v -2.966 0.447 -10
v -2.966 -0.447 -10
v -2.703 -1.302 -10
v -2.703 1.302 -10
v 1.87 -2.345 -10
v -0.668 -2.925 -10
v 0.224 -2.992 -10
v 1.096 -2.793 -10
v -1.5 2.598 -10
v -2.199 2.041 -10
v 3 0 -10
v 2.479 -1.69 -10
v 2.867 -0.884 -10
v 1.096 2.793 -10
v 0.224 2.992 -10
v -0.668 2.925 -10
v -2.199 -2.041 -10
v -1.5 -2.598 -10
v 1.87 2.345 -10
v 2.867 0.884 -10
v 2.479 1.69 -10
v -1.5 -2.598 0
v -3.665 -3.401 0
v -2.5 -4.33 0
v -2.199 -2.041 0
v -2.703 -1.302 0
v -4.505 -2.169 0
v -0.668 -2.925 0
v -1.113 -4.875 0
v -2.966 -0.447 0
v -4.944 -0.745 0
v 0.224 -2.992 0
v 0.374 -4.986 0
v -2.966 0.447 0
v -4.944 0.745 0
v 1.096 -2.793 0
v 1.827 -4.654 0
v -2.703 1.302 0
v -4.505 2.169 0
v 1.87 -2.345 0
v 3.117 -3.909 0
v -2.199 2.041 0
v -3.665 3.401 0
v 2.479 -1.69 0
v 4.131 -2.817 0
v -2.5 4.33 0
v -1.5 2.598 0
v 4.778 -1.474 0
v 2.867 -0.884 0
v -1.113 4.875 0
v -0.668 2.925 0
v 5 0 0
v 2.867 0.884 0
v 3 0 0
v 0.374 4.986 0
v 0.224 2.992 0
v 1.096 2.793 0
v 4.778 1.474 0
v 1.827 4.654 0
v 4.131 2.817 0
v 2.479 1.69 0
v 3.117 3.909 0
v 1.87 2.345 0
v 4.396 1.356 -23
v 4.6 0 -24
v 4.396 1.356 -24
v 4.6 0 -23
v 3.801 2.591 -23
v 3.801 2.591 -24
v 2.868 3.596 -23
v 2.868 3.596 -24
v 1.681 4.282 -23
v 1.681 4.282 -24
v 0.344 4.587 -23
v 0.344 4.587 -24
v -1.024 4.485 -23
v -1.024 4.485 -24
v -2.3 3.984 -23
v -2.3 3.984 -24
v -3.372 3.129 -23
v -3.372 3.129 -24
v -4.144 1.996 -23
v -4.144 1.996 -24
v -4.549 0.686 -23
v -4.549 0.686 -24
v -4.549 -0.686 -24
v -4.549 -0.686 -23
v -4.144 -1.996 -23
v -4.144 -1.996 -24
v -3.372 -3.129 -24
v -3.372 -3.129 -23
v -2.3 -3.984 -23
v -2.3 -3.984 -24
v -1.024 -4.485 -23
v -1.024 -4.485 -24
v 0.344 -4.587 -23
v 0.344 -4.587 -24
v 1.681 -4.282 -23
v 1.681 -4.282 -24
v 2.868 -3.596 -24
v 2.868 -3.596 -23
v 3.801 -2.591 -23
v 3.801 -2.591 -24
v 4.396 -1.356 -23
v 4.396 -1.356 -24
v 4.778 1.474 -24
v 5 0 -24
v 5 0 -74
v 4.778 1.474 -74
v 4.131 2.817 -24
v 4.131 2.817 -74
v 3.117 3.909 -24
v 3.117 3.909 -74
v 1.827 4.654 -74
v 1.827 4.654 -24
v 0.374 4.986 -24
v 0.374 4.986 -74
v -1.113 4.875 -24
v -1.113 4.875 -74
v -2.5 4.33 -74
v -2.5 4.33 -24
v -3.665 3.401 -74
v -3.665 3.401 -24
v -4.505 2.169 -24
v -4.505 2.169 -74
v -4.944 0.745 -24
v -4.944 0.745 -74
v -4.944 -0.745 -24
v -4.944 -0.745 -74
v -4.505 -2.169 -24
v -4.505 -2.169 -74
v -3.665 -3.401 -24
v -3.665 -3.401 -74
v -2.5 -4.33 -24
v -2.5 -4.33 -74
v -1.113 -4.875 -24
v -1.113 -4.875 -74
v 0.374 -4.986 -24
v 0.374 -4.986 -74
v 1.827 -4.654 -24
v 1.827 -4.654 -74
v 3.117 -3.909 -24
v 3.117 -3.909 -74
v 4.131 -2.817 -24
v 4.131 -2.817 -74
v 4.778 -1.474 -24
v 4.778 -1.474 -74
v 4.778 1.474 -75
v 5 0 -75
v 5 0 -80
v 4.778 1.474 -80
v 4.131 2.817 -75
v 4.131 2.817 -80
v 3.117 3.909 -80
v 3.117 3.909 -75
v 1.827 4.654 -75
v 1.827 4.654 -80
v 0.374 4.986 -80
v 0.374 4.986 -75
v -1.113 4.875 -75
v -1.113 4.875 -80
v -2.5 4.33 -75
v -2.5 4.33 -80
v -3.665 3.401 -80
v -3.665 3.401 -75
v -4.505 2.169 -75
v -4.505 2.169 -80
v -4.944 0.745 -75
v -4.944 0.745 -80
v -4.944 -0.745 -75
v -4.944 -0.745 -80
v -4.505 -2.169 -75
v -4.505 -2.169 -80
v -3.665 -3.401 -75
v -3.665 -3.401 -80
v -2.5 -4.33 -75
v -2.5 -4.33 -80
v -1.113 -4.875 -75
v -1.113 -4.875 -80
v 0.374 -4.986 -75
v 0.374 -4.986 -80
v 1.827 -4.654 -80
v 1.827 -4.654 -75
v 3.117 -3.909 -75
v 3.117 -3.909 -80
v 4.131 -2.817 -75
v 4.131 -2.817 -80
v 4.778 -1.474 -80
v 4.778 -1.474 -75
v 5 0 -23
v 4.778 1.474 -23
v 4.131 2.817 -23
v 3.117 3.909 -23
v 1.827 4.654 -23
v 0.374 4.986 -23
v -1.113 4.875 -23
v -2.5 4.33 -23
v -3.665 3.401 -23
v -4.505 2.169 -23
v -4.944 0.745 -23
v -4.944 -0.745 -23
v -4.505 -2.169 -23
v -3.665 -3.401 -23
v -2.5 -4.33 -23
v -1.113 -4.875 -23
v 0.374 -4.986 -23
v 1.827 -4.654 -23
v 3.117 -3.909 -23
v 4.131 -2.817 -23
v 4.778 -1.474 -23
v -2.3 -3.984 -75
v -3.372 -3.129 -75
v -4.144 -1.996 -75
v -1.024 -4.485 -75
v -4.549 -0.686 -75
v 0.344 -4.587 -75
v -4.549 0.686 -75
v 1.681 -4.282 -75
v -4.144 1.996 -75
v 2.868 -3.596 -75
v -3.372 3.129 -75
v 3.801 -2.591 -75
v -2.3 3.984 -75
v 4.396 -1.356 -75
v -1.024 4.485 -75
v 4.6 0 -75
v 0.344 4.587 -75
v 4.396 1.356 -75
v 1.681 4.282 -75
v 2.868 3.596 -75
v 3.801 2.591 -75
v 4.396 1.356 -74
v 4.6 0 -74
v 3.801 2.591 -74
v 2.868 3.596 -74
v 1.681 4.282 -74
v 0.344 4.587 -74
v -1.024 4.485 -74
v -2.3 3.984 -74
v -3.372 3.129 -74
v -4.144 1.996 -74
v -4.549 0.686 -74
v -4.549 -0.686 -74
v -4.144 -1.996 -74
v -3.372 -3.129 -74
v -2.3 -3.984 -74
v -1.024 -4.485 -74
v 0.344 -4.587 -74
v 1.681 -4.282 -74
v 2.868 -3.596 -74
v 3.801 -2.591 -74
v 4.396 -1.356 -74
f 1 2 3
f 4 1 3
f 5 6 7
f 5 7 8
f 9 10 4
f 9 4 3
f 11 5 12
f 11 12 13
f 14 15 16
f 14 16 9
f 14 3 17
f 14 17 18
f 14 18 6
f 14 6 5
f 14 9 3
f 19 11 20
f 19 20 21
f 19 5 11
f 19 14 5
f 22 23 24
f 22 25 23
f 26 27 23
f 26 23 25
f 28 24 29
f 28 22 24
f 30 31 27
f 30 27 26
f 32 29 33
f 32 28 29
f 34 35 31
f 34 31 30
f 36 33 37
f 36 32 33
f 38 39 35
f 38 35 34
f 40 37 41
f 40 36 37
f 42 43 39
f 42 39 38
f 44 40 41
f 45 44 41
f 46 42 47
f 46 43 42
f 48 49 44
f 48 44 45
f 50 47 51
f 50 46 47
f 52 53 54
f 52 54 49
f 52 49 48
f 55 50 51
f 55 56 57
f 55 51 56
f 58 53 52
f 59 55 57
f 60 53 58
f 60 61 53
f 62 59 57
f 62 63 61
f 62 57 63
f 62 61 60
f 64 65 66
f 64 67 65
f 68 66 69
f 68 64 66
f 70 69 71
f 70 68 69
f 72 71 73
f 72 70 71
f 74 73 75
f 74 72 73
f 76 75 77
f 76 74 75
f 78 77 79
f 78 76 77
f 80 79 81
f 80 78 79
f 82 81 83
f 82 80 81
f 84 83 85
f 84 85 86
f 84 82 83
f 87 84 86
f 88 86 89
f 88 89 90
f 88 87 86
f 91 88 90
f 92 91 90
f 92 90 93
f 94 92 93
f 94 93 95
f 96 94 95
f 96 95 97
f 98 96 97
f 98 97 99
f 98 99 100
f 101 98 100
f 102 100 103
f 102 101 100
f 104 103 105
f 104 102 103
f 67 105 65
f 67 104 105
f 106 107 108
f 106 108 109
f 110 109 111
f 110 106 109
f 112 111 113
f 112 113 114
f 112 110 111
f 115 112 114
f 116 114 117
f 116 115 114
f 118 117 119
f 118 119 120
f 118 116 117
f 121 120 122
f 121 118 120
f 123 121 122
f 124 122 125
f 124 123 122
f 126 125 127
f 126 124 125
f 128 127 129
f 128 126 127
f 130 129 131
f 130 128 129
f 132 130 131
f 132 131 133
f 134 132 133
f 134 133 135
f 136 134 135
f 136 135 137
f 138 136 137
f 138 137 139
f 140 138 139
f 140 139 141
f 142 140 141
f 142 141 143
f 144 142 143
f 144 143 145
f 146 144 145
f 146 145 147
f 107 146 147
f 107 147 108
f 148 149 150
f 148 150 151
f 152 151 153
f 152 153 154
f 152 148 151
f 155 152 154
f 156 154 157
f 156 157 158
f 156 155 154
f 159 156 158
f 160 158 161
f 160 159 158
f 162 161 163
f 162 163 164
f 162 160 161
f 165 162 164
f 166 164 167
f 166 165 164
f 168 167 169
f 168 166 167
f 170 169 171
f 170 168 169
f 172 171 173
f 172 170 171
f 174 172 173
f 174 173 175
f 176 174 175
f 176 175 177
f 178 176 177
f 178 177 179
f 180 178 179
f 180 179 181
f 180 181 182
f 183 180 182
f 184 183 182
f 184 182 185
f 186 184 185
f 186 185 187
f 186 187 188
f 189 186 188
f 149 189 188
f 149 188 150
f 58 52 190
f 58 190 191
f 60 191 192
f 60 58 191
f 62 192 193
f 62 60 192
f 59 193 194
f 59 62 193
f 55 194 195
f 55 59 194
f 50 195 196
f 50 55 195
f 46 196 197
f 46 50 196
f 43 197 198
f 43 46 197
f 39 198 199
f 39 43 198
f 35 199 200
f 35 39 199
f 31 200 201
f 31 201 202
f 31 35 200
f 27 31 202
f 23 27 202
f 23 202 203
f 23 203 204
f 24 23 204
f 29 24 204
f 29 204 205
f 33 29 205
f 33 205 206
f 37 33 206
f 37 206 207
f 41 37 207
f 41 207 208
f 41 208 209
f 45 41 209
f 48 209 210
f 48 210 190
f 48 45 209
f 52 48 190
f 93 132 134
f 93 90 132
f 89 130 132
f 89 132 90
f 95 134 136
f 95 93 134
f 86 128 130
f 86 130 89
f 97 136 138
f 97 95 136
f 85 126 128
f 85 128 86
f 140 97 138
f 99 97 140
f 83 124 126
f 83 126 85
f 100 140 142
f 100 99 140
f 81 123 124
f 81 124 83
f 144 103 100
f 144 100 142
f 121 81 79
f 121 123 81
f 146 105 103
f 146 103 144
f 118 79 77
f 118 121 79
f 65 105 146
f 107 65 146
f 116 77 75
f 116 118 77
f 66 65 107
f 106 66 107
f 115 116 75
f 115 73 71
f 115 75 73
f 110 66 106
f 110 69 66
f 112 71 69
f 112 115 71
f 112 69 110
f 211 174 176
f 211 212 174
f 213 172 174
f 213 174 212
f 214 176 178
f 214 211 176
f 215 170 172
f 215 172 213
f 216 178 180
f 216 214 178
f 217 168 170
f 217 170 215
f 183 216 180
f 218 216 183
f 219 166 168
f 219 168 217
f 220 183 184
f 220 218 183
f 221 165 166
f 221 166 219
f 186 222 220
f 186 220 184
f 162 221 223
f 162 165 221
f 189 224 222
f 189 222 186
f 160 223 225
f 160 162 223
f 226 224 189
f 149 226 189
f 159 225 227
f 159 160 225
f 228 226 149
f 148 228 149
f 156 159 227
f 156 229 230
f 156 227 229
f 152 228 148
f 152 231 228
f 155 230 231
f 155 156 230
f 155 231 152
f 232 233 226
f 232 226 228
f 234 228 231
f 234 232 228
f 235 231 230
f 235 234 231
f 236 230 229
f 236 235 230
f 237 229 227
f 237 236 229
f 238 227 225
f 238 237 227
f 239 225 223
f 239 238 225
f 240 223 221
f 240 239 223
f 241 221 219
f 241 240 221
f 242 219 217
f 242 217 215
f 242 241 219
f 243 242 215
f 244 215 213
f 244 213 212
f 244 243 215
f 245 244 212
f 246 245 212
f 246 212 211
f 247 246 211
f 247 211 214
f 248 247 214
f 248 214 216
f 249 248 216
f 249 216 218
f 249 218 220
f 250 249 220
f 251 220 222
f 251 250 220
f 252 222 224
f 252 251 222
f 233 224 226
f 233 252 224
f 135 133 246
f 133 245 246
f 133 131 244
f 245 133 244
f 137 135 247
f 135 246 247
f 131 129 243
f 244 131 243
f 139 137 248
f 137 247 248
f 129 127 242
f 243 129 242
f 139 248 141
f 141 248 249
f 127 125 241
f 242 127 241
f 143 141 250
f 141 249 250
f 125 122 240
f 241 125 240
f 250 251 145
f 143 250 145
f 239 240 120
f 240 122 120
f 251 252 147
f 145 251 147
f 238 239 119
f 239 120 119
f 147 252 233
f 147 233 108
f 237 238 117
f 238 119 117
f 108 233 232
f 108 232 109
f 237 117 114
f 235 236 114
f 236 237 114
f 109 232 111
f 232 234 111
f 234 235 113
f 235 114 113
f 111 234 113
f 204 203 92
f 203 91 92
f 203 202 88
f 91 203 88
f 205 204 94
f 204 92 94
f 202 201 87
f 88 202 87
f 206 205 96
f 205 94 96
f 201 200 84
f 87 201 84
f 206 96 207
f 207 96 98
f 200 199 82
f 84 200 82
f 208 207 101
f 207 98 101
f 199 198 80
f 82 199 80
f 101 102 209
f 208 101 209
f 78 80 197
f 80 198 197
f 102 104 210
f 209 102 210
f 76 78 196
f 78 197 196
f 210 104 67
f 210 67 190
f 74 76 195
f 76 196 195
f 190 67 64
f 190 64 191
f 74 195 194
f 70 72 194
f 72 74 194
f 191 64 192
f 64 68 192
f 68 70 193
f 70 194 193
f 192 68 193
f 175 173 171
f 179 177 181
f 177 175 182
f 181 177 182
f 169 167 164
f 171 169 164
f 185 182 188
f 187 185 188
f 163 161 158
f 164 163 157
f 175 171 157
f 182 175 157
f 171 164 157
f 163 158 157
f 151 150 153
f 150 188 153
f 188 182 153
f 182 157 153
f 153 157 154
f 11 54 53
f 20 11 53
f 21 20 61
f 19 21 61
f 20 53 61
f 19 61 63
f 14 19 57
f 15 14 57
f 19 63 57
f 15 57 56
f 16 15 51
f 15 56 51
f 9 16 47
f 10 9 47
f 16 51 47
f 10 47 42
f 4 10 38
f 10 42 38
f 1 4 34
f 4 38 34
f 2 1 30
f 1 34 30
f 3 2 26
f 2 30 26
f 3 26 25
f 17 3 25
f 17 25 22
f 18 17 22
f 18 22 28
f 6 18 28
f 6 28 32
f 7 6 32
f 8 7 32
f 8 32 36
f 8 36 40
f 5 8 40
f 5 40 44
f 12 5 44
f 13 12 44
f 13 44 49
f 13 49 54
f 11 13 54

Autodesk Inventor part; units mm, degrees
ref_plane "YZ Plane" through (0, 0, 0) normal (1, 0, 0) x (0, 1, 0)
ref_plane "XZ Plane" through (0, 0, 0) normal (0, 1, 0) x (-1, 0, 0)
ref_plane "XY Plane" through (0, 0, 0) normal (0, 0, 1) x (1, 0, 0)
sketch "Sketch2" plane through (0, 0, 0) normal (0, 0, 1) x (1, 0, 0)
  circle A0 centre (0, 0) radius 5
  dimension "d0" = 10
extrude "Extrusion1" add sketch "Sketch2" against normal blind 80
sketch "Sketch3" plane through (0, 0, 0) normal (0, 1, 0) x (-1, 0, 0)
  line L0 (-5, -80) -> (5, -80) projected
  line L1 (5, 0) -> (-5, 0) projected
  point P0 (0, 0)
sketch "Sketch4" plane through (0, 0, 0) normal (0, 1, 0) x (-1, 0, 0)
  line L0 (-5, 0) -> (-5, -80) projected
  line L1 (-5, -75) -> (-4.6, -75)
  line L2 (-4.6, -75) -> (-4.6, -74)
  line L3 (-4.6, -74) -> (-5, -74)
  line L4 (-5, -74) -> (-5, -75)
  line L5 (-5, -80) -> (5, -80) projected
  line L6 (0, -96) -> (0, 16) projected
  point P0 (0, 0)
  point P1 (-5, -74)
  dimension "d3" = 5
  dimension "d4" = 1
  dimension "d5" = 0.4
revolve "Revolution1" cut sketch "Sketch4" angle 360 about axis through (0, 0, 0) along (0, 0, 1)
sketch "Sketch5" plane through (0, 0, 0) normal (0, 1, 0) x (-1, 0, 0)
  line L0 (-5, 0) -> (-5, -74) projected
  line L1 (-5, -24) -> (-4.6, -24)
  line L2 (-4.6, -24) -> (-4.6, -23)
  line L3 (-4.6, -23) -> (-5, -23)
  line L4 (-5, -23) -> (-5, -24)
  line L5 (5, -74) -> (-5, -74) projected
  line L6 (0, -96) -> (0, 16) projected
  point P0 (0, 0)
  point P1 (-5, -23)
  dimension "d7" = 50
  dimension "d8" = 1
  dimension "d9" = 0.4
revolve "Revolution2" cut sketch "Sketch5" angle 360 about axis through (0, 0, 0) along (0, 0, 1)
sketch "Sketch7" plane through (0, 0, 0) normal (0, 0, 1) x (1, 0, 0)
  circle A0 centre (0, 0) radius 3
  dimension "d11" = 6
extrude "Extrusion2" cut sketch "Sketch7" against normal blind 10
equation "\"BendRadius\" = Thickness"
equation "\"BendReliefWidth\" = Thickness"
equation "\"BendReliefDepth\" = 0.5 * Thickness"
equation "\"CornerReliefSize\" = 4 * Thickness"
equation "\"MinimumRemnant\" = 2 * Thickness"
equation "\"TransitionRadius\" = BendRadius"
equation "\"JacobiRadiusSize\" = BendRadius"
equation "\"GapSize\" = Thickness"
equation "\"Thickness\" = 3.048"
properties part number "Shaft_potentiometer"
